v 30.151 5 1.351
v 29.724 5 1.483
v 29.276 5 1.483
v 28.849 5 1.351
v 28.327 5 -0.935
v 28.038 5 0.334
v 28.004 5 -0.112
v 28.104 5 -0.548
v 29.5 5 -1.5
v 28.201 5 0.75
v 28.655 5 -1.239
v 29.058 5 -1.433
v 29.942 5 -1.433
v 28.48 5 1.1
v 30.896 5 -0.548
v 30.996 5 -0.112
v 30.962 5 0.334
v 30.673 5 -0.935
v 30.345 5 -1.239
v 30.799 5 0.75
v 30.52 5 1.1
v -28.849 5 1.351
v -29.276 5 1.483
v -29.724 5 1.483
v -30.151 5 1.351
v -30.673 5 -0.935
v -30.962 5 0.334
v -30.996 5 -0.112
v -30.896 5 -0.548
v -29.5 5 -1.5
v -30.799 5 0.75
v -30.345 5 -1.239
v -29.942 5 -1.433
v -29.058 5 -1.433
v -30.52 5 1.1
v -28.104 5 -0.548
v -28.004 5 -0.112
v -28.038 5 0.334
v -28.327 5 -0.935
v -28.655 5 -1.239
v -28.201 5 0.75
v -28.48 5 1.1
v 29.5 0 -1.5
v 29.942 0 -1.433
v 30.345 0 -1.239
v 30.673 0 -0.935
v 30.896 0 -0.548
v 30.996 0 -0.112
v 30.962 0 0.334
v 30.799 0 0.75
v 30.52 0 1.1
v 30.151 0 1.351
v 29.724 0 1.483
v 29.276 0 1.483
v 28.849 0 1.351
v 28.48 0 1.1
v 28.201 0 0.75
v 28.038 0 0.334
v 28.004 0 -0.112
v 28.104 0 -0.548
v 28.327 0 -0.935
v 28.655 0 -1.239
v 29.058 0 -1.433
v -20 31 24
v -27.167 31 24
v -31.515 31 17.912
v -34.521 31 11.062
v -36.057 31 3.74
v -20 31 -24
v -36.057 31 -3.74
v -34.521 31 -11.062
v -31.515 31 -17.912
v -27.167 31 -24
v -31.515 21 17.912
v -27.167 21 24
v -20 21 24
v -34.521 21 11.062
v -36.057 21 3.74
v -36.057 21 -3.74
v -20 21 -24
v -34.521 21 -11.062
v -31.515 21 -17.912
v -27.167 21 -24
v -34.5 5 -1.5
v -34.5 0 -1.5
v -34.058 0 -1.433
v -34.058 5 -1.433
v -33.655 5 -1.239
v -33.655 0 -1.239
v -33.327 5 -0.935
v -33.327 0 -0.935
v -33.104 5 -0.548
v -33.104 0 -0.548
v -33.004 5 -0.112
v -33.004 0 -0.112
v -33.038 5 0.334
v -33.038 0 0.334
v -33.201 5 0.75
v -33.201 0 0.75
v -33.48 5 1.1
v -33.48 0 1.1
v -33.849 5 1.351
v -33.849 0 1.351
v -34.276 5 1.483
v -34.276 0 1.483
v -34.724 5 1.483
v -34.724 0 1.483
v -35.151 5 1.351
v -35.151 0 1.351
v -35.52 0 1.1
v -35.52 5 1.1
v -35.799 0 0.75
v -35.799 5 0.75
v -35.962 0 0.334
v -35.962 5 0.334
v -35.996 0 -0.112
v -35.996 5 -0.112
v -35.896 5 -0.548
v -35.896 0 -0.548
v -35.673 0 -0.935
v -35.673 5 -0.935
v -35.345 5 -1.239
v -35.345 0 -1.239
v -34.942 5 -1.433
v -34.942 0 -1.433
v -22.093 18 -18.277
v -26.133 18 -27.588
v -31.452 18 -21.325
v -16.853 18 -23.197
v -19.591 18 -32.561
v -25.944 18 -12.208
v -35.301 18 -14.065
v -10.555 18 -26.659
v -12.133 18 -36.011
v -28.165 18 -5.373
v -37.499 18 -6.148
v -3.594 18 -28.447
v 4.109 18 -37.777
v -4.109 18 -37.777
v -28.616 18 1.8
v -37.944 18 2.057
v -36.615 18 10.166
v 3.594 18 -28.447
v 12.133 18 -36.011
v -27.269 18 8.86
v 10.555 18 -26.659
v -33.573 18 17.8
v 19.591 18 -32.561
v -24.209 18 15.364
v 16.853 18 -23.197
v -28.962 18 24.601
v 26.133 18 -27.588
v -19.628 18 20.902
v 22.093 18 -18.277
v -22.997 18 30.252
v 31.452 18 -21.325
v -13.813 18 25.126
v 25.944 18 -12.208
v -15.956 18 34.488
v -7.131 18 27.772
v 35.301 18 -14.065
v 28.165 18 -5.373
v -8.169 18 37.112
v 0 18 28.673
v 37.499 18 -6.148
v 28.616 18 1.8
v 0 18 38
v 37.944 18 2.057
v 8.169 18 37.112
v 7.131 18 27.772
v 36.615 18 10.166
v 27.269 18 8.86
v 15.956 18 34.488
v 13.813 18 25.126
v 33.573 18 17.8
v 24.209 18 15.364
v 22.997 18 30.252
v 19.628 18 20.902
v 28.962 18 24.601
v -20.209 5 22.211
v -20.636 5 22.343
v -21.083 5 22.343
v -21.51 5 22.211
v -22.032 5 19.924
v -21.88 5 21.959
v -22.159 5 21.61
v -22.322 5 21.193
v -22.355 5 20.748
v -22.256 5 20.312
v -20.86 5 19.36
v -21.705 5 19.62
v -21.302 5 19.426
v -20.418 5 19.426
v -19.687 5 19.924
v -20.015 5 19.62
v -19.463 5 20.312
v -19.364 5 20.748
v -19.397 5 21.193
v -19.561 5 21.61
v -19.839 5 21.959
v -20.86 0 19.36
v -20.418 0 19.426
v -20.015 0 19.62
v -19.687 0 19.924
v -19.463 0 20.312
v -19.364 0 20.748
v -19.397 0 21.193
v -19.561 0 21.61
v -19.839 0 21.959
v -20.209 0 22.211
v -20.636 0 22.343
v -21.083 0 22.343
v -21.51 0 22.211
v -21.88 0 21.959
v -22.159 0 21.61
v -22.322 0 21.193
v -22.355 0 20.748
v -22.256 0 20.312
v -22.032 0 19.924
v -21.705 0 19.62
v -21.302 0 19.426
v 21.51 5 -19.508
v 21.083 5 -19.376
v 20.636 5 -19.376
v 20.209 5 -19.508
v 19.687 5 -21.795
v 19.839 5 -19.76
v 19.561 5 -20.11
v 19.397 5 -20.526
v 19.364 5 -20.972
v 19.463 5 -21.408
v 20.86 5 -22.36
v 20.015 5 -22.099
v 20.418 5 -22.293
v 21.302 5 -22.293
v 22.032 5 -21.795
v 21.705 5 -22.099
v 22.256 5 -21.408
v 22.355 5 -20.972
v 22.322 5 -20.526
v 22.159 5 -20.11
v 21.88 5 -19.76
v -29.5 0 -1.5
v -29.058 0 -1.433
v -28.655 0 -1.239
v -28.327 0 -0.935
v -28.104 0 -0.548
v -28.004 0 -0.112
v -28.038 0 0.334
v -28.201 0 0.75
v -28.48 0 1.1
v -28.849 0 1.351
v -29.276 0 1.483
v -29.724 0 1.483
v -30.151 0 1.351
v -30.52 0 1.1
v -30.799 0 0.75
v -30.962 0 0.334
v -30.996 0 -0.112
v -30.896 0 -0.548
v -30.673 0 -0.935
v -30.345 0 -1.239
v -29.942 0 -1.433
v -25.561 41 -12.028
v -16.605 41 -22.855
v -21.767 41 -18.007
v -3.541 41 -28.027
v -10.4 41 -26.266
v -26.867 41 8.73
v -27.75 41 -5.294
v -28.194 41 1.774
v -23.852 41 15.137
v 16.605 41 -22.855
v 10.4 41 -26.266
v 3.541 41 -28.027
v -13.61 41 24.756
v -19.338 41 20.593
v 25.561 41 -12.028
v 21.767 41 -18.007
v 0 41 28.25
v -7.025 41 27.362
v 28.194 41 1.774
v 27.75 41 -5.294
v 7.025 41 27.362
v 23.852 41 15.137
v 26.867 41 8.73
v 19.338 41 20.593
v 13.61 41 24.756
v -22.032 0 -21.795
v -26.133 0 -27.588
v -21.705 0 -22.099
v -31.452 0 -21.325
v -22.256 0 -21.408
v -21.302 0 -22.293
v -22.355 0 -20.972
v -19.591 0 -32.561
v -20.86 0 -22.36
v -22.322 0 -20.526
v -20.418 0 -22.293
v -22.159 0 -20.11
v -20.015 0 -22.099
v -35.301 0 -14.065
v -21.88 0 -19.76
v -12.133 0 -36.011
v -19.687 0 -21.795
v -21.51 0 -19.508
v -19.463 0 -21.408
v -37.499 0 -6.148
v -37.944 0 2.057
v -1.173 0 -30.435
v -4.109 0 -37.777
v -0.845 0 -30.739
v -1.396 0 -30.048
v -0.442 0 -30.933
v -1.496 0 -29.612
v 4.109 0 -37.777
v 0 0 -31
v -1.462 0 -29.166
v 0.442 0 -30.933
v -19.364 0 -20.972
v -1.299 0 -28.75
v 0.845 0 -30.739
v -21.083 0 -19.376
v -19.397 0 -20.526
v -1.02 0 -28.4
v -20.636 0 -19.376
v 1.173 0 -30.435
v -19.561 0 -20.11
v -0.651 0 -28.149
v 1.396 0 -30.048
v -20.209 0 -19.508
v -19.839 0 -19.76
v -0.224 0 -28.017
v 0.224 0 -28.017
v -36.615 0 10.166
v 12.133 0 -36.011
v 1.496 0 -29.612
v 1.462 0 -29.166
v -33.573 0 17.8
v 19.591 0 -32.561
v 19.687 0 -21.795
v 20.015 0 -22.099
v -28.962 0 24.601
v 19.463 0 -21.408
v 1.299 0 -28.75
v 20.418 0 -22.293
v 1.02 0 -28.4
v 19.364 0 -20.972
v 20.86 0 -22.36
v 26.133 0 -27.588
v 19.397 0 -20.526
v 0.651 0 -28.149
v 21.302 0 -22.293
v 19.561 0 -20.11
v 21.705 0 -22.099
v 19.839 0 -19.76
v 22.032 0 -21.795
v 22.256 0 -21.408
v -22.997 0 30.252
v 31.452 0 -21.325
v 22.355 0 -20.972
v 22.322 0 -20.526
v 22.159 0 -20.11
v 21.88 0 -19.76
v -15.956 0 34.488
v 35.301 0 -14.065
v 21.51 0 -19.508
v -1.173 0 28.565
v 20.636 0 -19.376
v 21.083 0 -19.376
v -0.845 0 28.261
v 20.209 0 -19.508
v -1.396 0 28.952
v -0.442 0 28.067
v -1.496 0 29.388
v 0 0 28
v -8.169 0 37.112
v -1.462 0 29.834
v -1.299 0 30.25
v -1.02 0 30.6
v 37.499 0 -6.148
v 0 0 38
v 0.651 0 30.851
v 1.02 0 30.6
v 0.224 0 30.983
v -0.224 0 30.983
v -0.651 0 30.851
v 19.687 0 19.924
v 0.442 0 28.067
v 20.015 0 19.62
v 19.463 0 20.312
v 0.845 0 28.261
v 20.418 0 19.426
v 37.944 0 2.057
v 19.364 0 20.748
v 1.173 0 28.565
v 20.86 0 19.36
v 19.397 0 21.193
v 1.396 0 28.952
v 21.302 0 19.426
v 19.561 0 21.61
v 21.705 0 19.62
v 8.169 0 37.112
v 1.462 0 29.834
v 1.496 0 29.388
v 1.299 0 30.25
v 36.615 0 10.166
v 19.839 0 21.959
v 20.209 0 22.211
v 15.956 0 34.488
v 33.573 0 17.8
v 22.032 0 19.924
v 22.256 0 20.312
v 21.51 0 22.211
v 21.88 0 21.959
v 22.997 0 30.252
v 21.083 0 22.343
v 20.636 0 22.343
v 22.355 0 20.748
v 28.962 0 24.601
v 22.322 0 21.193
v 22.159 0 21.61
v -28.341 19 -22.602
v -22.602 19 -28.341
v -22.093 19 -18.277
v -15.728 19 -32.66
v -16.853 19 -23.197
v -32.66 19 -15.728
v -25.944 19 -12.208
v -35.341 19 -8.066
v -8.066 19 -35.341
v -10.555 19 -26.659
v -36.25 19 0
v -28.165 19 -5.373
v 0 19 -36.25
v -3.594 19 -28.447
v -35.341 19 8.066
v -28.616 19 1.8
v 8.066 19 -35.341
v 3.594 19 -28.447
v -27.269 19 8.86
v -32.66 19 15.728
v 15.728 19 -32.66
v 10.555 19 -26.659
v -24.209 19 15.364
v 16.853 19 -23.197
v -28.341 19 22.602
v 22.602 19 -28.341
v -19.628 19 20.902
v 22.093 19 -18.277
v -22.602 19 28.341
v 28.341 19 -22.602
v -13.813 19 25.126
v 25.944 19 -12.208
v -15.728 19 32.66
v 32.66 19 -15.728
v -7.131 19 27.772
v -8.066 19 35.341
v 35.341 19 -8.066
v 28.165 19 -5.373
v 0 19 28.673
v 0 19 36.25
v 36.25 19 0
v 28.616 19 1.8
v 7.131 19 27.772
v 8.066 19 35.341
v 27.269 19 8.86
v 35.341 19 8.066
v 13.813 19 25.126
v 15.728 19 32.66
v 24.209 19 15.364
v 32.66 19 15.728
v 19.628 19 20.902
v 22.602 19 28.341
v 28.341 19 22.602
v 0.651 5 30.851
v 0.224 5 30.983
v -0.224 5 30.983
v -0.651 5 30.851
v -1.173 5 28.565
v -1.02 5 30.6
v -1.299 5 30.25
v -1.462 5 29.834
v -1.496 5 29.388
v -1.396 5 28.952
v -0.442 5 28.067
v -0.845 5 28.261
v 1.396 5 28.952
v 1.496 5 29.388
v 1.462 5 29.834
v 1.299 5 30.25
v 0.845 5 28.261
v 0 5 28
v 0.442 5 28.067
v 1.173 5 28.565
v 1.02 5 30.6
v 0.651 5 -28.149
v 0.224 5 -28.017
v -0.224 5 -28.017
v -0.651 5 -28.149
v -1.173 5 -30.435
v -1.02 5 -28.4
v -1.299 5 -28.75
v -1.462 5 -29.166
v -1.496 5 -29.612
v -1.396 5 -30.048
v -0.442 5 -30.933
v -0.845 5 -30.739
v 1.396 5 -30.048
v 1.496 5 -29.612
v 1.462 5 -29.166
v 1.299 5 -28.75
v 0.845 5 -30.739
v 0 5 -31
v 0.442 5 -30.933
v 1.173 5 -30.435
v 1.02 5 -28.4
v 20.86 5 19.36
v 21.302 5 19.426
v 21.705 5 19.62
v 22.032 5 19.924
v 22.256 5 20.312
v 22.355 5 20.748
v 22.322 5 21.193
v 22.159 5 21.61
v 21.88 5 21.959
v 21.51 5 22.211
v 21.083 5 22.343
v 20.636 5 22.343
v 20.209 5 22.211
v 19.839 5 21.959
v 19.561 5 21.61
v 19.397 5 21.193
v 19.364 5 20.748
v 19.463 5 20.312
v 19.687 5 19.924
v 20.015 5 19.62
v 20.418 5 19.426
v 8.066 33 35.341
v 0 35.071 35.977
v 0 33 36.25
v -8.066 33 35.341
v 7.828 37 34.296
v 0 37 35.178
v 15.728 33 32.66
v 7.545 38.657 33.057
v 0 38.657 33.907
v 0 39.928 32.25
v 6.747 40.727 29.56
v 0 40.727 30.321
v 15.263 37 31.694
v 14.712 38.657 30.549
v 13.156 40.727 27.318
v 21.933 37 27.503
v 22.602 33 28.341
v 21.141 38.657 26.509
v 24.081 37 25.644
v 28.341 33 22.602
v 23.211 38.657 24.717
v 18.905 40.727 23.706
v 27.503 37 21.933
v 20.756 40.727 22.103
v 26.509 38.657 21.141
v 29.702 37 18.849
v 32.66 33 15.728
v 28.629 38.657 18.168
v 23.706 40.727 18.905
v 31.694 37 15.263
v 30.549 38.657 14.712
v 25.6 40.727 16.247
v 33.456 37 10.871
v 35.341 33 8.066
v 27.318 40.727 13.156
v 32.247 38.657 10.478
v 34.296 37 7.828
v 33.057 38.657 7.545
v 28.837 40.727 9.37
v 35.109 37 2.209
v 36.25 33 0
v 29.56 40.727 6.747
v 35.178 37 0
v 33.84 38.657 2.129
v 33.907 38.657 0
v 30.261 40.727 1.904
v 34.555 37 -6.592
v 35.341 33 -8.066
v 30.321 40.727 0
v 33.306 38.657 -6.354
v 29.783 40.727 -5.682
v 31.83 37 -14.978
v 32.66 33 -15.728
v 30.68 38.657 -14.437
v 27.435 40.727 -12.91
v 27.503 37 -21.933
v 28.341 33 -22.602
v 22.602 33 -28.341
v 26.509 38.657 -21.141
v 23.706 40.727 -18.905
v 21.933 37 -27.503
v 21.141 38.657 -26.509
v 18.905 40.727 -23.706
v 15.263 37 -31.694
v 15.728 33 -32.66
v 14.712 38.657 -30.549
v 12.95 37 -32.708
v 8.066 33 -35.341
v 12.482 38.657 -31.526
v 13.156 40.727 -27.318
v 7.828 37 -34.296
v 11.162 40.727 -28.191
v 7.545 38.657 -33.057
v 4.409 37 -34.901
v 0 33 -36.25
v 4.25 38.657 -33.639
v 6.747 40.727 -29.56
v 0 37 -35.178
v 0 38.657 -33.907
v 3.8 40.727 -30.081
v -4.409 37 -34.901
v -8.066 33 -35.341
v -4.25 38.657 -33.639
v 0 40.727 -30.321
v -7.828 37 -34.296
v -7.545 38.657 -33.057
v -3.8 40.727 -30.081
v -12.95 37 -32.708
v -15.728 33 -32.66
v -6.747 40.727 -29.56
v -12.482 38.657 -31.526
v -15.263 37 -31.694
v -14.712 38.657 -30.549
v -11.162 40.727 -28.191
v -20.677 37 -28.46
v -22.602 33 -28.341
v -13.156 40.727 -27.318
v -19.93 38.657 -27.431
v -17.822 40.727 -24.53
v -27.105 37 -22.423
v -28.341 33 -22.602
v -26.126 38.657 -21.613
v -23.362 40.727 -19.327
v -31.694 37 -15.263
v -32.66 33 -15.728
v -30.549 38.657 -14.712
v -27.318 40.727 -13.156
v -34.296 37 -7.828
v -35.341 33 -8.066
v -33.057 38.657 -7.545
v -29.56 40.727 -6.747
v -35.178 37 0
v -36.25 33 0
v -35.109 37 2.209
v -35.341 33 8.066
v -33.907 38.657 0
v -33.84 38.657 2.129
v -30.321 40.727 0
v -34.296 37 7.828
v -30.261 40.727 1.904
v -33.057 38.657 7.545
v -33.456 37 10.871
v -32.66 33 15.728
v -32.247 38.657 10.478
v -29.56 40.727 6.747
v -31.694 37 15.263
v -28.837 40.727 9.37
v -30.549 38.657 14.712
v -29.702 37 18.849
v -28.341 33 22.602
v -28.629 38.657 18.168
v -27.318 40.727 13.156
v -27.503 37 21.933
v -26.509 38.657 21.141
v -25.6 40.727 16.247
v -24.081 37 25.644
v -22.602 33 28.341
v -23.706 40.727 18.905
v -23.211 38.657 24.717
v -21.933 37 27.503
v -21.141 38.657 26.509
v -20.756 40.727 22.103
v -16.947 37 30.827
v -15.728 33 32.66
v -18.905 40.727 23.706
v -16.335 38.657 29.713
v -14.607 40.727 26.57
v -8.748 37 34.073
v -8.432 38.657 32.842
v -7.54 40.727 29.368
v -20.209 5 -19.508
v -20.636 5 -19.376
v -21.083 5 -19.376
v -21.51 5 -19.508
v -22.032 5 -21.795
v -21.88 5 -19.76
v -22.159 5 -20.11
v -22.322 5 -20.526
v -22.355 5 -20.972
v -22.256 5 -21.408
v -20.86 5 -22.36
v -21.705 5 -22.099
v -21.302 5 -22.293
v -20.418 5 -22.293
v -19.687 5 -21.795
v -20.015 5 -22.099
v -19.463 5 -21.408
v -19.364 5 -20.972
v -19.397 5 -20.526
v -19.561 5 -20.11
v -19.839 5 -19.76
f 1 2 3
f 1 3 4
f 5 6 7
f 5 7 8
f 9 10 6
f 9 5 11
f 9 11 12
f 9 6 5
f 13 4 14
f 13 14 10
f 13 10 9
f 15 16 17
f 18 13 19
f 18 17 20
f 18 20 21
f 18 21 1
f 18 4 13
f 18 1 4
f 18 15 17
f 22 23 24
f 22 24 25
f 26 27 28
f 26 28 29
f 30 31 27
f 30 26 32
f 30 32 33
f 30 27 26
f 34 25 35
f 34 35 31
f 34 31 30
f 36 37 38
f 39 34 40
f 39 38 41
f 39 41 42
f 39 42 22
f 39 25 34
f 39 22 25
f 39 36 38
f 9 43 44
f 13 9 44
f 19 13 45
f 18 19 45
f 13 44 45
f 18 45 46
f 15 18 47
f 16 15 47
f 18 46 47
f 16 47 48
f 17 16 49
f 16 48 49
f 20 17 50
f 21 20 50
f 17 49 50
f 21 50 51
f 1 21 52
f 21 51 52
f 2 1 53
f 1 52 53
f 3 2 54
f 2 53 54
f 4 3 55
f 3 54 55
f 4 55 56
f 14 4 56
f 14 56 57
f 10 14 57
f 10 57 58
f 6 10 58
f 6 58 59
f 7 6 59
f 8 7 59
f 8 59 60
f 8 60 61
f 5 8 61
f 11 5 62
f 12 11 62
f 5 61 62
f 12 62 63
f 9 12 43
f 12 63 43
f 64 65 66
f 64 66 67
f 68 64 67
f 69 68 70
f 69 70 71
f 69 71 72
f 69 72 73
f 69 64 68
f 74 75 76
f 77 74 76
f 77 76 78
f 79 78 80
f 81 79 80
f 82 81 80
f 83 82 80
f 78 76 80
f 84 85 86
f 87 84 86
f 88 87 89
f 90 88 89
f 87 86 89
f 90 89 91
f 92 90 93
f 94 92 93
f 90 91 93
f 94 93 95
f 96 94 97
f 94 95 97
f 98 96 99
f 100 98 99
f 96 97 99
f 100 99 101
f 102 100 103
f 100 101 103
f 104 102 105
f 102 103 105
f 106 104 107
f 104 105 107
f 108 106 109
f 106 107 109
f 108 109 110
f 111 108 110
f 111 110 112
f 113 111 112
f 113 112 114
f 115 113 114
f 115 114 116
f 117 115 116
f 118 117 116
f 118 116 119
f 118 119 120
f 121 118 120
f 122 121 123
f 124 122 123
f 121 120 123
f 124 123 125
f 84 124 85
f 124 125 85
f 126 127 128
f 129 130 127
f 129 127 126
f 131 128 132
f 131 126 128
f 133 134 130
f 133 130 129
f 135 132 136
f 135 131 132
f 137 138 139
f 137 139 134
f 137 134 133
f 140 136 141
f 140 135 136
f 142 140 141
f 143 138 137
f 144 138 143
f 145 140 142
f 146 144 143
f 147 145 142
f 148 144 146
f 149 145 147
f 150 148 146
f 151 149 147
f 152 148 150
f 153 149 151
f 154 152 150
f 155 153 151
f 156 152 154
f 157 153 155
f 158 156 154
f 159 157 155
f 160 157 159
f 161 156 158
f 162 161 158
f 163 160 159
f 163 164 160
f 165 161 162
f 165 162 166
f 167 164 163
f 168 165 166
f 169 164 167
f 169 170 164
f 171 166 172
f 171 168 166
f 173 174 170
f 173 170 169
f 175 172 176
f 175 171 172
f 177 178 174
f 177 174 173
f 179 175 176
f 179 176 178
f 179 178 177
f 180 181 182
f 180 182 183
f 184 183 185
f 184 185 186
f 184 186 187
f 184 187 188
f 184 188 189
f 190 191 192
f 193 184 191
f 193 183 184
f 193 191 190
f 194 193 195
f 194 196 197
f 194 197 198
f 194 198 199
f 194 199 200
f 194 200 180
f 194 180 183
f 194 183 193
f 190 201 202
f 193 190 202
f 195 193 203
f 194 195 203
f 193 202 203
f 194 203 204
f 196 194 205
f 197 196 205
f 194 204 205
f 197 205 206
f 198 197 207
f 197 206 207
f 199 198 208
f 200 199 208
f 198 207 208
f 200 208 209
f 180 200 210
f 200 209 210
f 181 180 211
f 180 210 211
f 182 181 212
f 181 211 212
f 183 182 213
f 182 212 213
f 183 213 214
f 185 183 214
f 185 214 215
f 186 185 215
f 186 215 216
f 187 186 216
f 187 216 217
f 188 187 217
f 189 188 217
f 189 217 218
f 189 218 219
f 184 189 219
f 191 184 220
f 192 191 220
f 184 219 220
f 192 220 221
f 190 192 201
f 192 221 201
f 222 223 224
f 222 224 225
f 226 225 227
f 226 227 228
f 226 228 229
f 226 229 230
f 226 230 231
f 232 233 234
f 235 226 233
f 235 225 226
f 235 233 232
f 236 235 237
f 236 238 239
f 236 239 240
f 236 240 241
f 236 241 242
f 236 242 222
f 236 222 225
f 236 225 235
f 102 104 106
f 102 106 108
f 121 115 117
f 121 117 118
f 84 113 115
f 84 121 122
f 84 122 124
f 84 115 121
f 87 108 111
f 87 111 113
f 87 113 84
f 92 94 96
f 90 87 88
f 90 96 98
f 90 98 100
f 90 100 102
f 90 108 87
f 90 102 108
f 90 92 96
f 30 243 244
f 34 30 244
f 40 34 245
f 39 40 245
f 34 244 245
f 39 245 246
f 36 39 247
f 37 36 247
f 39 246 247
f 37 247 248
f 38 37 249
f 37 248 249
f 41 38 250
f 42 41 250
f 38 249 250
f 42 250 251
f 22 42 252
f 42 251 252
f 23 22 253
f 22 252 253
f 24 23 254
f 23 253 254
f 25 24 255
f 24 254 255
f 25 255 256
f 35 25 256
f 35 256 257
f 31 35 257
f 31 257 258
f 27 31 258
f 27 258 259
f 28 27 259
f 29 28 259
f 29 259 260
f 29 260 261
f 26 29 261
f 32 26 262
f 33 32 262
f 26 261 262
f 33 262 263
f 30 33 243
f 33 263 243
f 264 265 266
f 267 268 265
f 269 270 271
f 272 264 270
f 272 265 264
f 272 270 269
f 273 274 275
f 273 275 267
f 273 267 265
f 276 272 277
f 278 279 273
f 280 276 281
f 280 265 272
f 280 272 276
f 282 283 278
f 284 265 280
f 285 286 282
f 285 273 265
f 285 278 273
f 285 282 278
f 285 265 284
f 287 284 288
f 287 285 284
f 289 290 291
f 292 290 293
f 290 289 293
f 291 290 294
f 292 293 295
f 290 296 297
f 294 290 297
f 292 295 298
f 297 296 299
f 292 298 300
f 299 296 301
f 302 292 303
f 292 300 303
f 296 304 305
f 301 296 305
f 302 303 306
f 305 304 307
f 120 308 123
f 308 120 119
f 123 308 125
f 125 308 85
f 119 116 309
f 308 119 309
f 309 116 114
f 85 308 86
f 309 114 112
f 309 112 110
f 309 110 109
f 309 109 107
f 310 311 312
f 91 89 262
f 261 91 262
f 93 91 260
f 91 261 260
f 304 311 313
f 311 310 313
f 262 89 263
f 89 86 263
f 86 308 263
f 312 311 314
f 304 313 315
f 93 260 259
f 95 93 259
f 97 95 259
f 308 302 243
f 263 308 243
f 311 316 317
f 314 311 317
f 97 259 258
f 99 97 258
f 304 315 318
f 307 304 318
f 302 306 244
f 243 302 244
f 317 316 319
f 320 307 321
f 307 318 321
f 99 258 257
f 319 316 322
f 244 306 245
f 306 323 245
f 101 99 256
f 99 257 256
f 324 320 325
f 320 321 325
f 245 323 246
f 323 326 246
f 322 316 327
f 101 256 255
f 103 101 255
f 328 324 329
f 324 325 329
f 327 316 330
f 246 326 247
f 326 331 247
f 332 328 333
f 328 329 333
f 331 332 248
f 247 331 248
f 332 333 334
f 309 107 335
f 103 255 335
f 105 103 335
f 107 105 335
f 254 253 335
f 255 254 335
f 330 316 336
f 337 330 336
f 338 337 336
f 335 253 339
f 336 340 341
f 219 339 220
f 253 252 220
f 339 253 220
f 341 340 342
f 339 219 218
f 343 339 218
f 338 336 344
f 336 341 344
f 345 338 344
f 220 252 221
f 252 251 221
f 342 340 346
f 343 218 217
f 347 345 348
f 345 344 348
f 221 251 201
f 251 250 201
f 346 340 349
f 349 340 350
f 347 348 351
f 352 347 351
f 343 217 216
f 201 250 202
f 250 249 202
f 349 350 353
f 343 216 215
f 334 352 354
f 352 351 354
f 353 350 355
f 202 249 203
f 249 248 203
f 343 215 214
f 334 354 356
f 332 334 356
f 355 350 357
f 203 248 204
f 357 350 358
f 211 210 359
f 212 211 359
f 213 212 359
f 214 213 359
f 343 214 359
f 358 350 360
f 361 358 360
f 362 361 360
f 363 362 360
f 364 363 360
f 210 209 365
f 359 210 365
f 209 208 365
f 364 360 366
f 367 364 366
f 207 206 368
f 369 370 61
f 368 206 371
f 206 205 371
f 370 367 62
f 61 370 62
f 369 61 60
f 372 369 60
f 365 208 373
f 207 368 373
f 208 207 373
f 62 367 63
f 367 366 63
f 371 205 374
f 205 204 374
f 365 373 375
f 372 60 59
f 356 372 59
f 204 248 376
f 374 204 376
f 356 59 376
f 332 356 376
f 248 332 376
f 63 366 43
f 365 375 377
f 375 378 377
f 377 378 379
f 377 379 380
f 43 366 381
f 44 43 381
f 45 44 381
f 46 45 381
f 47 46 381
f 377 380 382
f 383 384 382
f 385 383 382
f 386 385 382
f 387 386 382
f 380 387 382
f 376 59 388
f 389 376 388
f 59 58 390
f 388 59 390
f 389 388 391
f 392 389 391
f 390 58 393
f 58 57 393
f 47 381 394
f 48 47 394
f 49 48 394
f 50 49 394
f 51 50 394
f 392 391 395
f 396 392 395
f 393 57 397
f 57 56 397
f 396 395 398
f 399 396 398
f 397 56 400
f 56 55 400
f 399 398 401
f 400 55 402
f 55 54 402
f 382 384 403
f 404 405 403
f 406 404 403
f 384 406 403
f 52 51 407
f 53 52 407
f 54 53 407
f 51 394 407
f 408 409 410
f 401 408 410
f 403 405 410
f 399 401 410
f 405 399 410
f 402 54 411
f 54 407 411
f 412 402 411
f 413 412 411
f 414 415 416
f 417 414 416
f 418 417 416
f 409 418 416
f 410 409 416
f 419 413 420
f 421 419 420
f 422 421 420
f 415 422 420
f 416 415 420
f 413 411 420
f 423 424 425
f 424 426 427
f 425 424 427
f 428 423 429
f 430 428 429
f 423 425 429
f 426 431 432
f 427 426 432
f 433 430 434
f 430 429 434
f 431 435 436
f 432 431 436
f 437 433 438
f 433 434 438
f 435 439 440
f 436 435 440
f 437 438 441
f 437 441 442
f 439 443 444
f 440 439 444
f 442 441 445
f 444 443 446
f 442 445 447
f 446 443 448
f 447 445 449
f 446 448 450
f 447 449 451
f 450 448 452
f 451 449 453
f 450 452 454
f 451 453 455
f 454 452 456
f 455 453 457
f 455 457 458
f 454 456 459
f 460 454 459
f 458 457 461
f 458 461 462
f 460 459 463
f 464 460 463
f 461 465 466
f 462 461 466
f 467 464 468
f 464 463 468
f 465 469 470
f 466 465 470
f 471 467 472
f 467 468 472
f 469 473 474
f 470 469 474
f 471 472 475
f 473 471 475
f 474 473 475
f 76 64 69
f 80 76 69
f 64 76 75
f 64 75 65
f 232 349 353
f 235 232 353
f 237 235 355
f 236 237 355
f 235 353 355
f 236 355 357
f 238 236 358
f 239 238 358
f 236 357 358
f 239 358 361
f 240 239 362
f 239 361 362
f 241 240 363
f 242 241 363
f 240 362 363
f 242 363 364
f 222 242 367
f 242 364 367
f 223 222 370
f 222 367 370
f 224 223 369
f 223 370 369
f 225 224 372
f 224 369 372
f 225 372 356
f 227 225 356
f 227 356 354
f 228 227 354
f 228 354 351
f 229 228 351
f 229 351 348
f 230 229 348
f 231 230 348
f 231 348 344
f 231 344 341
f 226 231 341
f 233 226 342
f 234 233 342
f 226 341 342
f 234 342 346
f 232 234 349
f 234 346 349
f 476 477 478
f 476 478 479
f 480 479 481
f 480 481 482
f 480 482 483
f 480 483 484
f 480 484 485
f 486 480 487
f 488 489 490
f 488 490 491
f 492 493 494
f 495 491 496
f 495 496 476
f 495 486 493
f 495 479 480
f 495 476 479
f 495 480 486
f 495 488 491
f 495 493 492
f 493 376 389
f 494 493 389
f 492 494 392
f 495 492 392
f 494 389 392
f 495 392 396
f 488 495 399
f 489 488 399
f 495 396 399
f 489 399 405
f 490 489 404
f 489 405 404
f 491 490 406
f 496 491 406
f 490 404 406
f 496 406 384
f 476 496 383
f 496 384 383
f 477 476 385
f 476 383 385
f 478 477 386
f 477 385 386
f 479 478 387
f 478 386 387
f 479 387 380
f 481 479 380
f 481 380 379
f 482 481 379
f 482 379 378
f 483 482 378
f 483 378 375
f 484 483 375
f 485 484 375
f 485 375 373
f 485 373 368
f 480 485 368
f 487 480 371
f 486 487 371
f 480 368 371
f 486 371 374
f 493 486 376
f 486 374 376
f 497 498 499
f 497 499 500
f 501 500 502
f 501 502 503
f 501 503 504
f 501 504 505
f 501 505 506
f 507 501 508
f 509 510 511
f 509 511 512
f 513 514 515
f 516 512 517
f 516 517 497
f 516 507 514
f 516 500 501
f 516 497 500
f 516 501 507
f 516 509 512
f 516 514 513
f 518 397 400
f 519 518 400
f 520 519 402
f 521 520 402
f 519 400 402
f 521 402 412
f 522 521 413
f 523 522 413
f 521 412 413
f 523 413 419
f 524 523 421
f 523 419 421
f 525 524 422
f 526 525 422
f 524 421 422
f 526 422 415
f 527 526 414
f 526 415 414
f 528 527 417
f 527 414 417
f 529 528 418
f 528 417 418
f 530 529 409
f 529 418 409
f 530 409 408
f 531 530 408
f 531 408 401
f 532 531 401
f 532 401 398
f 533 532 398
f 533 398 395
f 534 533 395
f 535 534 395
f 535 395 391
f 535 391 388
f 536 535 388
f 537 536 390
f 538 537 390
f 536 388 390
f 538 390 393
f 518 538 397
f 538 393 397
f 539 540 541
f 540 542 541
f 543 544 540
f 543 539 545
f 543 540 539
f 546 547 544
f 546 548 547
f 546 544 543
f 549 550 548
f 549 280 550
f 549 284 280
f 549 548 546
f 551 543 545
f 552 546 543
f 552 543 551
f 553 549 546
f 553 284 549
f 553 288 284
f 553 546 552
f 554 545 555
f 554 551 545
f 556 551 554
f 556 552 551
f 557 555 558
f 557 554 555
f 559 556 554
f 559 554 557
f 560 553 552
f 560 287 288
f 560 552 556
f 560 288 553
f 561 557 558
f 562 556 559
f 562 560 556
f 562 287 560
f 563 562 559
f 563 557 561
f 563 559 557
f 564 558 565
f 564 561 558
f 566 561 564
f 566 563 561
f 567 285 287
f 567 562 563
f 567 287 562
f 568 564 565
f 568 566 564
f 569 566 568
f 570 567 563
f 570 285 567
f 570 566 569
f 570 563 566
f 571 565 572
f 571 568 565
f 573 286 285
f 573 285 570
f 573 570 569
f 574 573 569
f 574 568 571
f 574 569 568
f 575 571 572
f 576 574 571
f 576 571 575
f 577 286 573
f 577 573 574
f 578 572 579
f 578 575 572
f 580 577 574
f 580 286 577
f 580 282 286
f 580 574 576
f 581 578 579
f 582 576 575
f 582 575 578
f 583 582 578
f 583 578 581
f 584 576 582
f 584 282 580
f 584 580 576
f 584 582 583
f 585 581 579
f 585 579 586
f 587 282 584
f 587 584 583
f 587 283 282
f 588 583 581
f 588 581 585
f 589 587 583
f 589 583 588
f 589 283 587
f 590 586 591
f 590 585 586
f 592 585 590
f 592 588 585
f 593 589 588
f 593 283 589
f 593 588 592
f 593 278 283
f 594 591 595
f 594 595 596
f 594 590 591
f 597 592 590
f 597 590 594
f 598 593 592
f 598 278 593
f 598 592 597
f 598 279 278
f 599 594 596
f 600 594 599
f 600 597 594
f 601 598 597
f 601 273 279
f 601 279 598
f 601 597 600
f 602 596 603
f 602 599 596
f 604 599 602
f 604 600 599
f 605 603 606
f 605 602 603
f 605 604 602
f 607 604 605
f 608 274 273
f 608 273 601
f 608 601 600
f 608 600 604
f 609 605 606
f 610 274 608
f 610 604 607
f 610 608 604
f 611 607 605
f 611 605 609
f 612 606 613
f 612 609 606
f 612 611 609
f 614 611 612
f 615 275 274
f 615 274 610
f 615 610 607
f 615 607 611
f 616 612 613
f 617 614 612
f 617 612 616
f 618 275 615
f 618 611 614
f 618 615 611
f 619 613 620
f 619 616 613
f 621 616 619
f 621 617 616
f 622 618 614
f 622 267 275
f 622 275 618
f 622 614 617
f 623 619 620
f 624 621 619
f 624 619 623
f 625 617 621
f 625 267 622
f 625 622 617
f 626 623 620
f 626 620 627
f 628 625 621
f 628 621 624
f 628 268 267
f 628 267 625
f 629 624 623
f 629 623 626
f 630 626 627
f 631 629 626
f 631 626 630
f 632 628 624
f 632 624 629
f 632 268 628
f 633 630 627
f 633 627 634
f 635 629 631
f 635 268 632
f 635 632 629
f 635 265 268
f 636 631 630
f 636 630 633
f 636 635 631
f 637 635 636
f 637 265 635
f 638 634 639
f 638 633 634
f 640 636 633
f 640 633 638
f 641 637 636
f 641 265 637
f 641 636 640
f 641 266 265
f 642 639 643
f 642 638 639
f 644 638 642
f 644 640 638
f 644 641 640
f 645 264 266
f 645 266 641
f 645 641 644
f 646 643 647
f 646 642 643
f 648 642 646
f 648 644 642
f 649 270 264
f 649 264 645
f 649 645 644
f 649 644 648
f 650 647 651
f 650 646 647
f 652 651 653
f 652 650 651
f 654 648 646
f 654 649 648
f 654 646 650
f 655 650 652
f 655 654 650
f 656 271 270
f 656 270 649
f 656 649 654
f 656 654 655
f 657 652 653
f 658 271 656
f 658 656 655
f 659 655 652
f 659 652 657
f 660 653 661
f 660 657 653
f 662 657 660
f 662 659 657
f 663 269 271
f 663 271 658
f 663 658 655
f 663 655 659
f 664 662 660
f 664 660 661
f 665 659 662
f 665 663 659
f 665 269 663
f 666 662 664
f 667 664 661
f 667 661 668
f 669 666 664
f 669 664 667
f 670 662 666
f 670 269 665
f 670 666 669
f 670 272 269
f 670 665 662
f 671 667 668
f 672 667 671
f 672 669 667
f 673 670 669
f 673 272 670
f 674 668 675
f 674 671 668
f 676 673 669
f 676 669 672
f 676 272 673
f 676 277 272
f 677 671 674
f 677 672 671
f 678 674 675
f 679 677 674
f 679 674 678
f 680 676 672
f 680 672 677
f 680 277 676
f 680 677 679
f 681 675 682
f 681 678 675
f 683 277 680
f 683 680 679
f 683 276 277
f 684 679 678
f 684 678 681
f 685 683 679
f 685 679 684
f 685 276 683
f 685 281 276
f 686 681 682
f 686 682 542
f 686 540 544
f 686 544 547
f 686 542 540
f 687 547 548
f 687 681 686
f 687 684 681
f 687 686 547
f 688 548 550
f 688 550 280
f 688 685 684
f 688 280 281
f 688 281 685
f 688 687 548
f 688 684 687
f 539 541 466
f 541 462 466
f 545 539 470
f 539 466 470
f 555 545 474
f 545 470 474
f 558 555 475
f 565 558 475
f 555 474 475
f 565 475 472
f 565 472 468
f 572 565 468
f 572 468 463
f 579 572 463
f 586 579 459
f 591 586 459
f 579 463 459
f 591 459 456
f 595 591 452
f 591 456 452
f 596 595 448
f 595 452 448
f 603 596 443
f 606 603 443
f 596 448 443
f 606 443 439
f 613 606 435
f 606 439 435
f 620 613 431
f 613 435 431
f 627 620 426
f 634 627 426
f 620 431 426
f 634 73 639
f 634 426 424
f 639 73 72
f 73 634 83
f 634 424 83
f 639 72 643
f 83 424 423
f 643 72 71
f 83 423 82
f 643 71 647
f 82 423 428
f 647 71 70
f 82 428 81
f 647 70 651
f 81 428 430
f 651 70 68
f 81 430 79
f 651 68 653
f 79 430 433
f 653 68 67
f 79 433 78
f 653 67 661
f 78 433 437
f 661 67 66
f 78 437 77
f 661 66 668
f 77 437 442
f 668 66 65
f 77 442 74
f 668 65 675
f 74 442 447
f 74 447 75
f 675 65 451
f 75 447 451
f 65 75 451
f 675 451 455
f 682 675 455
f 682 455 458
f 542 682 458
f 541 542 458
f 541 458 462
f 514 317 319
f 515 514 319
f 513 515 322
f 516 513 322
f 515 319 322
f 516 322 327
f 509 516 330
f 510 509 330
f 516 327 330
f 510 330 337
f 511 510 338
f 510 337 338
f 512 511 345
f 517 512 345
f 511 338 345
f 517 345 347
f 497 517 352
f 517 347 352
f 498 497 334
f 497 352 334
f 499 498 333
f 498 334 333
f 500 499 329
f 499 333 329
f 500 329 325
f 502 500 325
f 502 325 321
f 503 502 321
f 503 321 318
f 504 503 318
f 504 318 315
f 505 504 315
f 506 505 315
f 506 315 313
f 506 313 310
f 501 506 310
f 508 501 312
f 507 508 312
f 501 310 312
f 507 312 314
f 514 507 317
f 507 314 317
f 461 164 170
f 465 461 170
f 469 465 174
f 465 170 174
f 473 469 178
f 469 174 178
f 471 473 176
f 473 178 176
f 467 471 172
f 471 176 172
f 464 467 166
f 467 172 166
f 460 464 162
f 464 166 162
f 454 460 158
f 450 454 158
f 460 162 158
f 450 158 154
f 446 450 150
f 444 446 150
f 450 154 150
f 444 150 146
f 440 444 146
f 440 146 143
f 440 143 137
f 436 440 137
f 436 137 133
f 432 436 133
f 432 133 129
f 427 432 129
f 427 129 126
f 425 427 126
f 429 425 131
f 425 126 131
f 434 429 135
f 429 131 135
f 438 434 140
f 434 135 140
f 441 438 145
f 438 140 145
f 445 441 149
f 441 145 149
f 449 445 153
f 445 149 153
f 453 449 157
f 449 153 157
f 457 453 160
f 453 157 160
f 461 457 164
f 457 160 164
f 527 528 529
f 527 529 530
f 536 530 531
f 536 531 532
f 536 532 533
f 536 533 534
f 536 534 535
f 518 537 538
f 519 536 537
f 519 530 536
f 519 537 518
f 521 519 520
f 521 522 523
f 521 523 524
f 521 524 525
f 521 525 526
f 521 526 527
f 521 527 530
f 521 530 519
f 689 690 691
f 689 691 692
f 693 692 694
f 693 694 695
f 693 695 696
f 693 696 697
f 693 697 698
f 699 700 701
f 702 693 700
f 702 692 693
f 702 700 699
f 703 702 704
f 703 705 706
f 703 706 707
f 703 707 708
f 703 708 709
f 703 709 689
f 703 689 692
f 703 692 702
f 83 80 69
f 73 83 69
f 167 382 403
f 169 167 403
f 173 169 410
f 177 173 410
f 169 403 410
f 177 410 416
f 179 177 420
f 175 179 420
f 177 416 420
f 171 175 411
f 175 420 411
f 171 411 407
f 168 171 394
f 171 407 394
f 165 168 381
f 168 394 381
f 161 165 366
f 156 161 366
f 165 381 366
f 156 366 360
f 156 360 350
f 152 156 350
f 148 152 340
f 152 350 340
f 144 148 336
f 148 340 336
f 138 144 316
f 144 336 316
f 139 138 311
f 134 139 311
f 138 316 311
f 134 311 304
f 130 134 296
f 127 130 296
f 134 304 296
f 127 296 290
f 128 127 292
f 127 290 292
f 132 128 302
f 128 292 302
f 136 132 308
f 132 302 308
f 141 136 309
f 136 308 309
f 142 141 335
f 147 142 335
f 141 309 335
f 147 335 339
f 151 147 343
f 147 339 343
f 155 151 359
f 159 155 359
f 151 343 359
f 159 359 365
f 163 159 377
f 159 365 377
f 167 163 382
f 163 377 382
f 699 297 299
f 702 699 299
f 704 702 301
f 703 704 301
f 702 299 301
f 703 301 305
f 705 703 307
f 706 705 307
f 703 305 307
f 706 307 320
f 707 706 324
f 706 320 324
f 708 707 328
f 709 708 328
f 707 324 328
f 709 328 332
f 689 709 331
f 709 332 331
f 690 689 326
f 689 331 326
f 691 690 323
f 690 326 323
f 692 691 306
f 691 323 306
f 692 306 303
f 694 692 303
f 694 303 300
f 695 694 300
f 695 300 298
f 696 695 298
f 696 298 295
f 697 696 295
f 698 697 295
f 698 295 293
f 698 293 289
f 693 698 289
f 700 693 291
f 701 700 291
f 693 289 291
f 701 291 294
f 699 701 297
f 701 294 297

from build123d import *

# Parameters (mm, degrees)
SKETCH_1_R          = 38
EXTRUDE_1_DEPTH     = 18
SKETCH_2_R          = 28.672717561
EXTRUDE_2_DEPTH     = 1
SKETCH_3_R          = 36.25
EXTRUDE_3_DEPTH     = 22
FILLET_1_R          = 8
SKETCH_4_R          = 1.5
CUT_EXTRUDE_1_DEPTH = 5
CUT_EXTRUDE_START   = -20
SKETCH_5_W          = 48
SKETCH_5_H          = 10
CUT_EXTRUDE_2_DEPTH = 100


with BuildPart() as part:
    # 草图1 → 凸台-拉伸1 (new body)
    with BuildSketch(Plane(origin=(0, 0, 0), x_dir=(1, 0, 0), z_dir=(0, 1, 0))):
        with Locations(Location((0, 0, 0), (0, 0, 270))):
            Circle(SKETCH_1_R)
    extrude(amount=EXTRUDE_1_DEPTH)

    # 草图2 → 凸台-拉伸2 (add)
    with BuildSketch(Plane(origin=(0, 18, 0), x_dir=(1, 0, 0), z_dir=(0, 1, 0))):
        with Locations(Location((0, 0, 0), (0, 0, 270))):
            Circle(SKETCH_2_R)
    extrude(amount=EXTRUDE_2_DEPTH)

    # 草图3 → 凸台-拉伸3 (add)
    with BuildSketch(Plane(origin=(0, 19, 0), x_dir=(1, 0, 0), z_dir=(0, 1, 0))):
        with Locations(Location((0, 0, 0), (0, 0, 270))):
            Circle(SKETCH_3_R)
    extrude(amount=EXTRUDE_3_DEPTH)

    # 圆角1
    fillet_1_edges = [part.edges().sort_by_distance(p)[0] for p in [
        (0, 41, -36.25),
    ]]
    fillet(fillet_1_edges, radius=FILLET_1_R)

    # 草图4 → 切除-拉伸1 (cut)
    with BuildSketch(Plane.XZ):
        with Locations(Location((-29.5, 0, 0), (0, 0, 270))):
            Circle(SKETCH_4_R)
        with Locations(Location((-20.859650045, 20.859650045, 0), (0, 0, 270))):
            Circle(SKETCH_4_R)
        with Locations(Location((0, 29.5, 0), (0, 0, 270))):
            Circle(SKETCH_4_R)
        with Locations(Location((20.859650045, 20.859650045, 0), (0, 0, 270))):
            Circle(SKETCH_4_R)
        with Locations(Location((-34.5, 0, 0), (0, 0, 270))):
            Circle(SKETCH_4_R)
        with Locations(Location((29.5, 0, 0), (0, 0, 270))):
            Circle(SKETCH_4_R)
        with Locations(Location((20.859650045, -20.859650045, 0), (0, 0, 270))):
            Circle(SKETCH_4_R)
        with Locations(Location((0, -29.5, 0), (0, 0, 270))):
            Circle(SKETCH_4_R)
        with Locations(Location((-20.859650045, -20.859650045, 0), (0, 0, 270))):
            Circle(SKETCH_4_R)
    extrude(amount=-CUT_EXTRUDE_1_DEPTH, mode=Mode.SUBTRACT)

    # 草图5 → 切除-拉伸2 (cut)
    with BuildSketch(Plane(origin=(0, 0, 0), x_dir=(0, 0, -1), z_dir=(1, 0, 0)).offset(CUT_EXTRUDE_START)):
        with Locations((0, 26)):
            Rectangle(SKETCH_5_W, SKETCH_5_H)
    extrude(amount=-CUT_EXTRUDE_2_DEPTH, mode=Mode.SUBTRACT)


solid = part.part
